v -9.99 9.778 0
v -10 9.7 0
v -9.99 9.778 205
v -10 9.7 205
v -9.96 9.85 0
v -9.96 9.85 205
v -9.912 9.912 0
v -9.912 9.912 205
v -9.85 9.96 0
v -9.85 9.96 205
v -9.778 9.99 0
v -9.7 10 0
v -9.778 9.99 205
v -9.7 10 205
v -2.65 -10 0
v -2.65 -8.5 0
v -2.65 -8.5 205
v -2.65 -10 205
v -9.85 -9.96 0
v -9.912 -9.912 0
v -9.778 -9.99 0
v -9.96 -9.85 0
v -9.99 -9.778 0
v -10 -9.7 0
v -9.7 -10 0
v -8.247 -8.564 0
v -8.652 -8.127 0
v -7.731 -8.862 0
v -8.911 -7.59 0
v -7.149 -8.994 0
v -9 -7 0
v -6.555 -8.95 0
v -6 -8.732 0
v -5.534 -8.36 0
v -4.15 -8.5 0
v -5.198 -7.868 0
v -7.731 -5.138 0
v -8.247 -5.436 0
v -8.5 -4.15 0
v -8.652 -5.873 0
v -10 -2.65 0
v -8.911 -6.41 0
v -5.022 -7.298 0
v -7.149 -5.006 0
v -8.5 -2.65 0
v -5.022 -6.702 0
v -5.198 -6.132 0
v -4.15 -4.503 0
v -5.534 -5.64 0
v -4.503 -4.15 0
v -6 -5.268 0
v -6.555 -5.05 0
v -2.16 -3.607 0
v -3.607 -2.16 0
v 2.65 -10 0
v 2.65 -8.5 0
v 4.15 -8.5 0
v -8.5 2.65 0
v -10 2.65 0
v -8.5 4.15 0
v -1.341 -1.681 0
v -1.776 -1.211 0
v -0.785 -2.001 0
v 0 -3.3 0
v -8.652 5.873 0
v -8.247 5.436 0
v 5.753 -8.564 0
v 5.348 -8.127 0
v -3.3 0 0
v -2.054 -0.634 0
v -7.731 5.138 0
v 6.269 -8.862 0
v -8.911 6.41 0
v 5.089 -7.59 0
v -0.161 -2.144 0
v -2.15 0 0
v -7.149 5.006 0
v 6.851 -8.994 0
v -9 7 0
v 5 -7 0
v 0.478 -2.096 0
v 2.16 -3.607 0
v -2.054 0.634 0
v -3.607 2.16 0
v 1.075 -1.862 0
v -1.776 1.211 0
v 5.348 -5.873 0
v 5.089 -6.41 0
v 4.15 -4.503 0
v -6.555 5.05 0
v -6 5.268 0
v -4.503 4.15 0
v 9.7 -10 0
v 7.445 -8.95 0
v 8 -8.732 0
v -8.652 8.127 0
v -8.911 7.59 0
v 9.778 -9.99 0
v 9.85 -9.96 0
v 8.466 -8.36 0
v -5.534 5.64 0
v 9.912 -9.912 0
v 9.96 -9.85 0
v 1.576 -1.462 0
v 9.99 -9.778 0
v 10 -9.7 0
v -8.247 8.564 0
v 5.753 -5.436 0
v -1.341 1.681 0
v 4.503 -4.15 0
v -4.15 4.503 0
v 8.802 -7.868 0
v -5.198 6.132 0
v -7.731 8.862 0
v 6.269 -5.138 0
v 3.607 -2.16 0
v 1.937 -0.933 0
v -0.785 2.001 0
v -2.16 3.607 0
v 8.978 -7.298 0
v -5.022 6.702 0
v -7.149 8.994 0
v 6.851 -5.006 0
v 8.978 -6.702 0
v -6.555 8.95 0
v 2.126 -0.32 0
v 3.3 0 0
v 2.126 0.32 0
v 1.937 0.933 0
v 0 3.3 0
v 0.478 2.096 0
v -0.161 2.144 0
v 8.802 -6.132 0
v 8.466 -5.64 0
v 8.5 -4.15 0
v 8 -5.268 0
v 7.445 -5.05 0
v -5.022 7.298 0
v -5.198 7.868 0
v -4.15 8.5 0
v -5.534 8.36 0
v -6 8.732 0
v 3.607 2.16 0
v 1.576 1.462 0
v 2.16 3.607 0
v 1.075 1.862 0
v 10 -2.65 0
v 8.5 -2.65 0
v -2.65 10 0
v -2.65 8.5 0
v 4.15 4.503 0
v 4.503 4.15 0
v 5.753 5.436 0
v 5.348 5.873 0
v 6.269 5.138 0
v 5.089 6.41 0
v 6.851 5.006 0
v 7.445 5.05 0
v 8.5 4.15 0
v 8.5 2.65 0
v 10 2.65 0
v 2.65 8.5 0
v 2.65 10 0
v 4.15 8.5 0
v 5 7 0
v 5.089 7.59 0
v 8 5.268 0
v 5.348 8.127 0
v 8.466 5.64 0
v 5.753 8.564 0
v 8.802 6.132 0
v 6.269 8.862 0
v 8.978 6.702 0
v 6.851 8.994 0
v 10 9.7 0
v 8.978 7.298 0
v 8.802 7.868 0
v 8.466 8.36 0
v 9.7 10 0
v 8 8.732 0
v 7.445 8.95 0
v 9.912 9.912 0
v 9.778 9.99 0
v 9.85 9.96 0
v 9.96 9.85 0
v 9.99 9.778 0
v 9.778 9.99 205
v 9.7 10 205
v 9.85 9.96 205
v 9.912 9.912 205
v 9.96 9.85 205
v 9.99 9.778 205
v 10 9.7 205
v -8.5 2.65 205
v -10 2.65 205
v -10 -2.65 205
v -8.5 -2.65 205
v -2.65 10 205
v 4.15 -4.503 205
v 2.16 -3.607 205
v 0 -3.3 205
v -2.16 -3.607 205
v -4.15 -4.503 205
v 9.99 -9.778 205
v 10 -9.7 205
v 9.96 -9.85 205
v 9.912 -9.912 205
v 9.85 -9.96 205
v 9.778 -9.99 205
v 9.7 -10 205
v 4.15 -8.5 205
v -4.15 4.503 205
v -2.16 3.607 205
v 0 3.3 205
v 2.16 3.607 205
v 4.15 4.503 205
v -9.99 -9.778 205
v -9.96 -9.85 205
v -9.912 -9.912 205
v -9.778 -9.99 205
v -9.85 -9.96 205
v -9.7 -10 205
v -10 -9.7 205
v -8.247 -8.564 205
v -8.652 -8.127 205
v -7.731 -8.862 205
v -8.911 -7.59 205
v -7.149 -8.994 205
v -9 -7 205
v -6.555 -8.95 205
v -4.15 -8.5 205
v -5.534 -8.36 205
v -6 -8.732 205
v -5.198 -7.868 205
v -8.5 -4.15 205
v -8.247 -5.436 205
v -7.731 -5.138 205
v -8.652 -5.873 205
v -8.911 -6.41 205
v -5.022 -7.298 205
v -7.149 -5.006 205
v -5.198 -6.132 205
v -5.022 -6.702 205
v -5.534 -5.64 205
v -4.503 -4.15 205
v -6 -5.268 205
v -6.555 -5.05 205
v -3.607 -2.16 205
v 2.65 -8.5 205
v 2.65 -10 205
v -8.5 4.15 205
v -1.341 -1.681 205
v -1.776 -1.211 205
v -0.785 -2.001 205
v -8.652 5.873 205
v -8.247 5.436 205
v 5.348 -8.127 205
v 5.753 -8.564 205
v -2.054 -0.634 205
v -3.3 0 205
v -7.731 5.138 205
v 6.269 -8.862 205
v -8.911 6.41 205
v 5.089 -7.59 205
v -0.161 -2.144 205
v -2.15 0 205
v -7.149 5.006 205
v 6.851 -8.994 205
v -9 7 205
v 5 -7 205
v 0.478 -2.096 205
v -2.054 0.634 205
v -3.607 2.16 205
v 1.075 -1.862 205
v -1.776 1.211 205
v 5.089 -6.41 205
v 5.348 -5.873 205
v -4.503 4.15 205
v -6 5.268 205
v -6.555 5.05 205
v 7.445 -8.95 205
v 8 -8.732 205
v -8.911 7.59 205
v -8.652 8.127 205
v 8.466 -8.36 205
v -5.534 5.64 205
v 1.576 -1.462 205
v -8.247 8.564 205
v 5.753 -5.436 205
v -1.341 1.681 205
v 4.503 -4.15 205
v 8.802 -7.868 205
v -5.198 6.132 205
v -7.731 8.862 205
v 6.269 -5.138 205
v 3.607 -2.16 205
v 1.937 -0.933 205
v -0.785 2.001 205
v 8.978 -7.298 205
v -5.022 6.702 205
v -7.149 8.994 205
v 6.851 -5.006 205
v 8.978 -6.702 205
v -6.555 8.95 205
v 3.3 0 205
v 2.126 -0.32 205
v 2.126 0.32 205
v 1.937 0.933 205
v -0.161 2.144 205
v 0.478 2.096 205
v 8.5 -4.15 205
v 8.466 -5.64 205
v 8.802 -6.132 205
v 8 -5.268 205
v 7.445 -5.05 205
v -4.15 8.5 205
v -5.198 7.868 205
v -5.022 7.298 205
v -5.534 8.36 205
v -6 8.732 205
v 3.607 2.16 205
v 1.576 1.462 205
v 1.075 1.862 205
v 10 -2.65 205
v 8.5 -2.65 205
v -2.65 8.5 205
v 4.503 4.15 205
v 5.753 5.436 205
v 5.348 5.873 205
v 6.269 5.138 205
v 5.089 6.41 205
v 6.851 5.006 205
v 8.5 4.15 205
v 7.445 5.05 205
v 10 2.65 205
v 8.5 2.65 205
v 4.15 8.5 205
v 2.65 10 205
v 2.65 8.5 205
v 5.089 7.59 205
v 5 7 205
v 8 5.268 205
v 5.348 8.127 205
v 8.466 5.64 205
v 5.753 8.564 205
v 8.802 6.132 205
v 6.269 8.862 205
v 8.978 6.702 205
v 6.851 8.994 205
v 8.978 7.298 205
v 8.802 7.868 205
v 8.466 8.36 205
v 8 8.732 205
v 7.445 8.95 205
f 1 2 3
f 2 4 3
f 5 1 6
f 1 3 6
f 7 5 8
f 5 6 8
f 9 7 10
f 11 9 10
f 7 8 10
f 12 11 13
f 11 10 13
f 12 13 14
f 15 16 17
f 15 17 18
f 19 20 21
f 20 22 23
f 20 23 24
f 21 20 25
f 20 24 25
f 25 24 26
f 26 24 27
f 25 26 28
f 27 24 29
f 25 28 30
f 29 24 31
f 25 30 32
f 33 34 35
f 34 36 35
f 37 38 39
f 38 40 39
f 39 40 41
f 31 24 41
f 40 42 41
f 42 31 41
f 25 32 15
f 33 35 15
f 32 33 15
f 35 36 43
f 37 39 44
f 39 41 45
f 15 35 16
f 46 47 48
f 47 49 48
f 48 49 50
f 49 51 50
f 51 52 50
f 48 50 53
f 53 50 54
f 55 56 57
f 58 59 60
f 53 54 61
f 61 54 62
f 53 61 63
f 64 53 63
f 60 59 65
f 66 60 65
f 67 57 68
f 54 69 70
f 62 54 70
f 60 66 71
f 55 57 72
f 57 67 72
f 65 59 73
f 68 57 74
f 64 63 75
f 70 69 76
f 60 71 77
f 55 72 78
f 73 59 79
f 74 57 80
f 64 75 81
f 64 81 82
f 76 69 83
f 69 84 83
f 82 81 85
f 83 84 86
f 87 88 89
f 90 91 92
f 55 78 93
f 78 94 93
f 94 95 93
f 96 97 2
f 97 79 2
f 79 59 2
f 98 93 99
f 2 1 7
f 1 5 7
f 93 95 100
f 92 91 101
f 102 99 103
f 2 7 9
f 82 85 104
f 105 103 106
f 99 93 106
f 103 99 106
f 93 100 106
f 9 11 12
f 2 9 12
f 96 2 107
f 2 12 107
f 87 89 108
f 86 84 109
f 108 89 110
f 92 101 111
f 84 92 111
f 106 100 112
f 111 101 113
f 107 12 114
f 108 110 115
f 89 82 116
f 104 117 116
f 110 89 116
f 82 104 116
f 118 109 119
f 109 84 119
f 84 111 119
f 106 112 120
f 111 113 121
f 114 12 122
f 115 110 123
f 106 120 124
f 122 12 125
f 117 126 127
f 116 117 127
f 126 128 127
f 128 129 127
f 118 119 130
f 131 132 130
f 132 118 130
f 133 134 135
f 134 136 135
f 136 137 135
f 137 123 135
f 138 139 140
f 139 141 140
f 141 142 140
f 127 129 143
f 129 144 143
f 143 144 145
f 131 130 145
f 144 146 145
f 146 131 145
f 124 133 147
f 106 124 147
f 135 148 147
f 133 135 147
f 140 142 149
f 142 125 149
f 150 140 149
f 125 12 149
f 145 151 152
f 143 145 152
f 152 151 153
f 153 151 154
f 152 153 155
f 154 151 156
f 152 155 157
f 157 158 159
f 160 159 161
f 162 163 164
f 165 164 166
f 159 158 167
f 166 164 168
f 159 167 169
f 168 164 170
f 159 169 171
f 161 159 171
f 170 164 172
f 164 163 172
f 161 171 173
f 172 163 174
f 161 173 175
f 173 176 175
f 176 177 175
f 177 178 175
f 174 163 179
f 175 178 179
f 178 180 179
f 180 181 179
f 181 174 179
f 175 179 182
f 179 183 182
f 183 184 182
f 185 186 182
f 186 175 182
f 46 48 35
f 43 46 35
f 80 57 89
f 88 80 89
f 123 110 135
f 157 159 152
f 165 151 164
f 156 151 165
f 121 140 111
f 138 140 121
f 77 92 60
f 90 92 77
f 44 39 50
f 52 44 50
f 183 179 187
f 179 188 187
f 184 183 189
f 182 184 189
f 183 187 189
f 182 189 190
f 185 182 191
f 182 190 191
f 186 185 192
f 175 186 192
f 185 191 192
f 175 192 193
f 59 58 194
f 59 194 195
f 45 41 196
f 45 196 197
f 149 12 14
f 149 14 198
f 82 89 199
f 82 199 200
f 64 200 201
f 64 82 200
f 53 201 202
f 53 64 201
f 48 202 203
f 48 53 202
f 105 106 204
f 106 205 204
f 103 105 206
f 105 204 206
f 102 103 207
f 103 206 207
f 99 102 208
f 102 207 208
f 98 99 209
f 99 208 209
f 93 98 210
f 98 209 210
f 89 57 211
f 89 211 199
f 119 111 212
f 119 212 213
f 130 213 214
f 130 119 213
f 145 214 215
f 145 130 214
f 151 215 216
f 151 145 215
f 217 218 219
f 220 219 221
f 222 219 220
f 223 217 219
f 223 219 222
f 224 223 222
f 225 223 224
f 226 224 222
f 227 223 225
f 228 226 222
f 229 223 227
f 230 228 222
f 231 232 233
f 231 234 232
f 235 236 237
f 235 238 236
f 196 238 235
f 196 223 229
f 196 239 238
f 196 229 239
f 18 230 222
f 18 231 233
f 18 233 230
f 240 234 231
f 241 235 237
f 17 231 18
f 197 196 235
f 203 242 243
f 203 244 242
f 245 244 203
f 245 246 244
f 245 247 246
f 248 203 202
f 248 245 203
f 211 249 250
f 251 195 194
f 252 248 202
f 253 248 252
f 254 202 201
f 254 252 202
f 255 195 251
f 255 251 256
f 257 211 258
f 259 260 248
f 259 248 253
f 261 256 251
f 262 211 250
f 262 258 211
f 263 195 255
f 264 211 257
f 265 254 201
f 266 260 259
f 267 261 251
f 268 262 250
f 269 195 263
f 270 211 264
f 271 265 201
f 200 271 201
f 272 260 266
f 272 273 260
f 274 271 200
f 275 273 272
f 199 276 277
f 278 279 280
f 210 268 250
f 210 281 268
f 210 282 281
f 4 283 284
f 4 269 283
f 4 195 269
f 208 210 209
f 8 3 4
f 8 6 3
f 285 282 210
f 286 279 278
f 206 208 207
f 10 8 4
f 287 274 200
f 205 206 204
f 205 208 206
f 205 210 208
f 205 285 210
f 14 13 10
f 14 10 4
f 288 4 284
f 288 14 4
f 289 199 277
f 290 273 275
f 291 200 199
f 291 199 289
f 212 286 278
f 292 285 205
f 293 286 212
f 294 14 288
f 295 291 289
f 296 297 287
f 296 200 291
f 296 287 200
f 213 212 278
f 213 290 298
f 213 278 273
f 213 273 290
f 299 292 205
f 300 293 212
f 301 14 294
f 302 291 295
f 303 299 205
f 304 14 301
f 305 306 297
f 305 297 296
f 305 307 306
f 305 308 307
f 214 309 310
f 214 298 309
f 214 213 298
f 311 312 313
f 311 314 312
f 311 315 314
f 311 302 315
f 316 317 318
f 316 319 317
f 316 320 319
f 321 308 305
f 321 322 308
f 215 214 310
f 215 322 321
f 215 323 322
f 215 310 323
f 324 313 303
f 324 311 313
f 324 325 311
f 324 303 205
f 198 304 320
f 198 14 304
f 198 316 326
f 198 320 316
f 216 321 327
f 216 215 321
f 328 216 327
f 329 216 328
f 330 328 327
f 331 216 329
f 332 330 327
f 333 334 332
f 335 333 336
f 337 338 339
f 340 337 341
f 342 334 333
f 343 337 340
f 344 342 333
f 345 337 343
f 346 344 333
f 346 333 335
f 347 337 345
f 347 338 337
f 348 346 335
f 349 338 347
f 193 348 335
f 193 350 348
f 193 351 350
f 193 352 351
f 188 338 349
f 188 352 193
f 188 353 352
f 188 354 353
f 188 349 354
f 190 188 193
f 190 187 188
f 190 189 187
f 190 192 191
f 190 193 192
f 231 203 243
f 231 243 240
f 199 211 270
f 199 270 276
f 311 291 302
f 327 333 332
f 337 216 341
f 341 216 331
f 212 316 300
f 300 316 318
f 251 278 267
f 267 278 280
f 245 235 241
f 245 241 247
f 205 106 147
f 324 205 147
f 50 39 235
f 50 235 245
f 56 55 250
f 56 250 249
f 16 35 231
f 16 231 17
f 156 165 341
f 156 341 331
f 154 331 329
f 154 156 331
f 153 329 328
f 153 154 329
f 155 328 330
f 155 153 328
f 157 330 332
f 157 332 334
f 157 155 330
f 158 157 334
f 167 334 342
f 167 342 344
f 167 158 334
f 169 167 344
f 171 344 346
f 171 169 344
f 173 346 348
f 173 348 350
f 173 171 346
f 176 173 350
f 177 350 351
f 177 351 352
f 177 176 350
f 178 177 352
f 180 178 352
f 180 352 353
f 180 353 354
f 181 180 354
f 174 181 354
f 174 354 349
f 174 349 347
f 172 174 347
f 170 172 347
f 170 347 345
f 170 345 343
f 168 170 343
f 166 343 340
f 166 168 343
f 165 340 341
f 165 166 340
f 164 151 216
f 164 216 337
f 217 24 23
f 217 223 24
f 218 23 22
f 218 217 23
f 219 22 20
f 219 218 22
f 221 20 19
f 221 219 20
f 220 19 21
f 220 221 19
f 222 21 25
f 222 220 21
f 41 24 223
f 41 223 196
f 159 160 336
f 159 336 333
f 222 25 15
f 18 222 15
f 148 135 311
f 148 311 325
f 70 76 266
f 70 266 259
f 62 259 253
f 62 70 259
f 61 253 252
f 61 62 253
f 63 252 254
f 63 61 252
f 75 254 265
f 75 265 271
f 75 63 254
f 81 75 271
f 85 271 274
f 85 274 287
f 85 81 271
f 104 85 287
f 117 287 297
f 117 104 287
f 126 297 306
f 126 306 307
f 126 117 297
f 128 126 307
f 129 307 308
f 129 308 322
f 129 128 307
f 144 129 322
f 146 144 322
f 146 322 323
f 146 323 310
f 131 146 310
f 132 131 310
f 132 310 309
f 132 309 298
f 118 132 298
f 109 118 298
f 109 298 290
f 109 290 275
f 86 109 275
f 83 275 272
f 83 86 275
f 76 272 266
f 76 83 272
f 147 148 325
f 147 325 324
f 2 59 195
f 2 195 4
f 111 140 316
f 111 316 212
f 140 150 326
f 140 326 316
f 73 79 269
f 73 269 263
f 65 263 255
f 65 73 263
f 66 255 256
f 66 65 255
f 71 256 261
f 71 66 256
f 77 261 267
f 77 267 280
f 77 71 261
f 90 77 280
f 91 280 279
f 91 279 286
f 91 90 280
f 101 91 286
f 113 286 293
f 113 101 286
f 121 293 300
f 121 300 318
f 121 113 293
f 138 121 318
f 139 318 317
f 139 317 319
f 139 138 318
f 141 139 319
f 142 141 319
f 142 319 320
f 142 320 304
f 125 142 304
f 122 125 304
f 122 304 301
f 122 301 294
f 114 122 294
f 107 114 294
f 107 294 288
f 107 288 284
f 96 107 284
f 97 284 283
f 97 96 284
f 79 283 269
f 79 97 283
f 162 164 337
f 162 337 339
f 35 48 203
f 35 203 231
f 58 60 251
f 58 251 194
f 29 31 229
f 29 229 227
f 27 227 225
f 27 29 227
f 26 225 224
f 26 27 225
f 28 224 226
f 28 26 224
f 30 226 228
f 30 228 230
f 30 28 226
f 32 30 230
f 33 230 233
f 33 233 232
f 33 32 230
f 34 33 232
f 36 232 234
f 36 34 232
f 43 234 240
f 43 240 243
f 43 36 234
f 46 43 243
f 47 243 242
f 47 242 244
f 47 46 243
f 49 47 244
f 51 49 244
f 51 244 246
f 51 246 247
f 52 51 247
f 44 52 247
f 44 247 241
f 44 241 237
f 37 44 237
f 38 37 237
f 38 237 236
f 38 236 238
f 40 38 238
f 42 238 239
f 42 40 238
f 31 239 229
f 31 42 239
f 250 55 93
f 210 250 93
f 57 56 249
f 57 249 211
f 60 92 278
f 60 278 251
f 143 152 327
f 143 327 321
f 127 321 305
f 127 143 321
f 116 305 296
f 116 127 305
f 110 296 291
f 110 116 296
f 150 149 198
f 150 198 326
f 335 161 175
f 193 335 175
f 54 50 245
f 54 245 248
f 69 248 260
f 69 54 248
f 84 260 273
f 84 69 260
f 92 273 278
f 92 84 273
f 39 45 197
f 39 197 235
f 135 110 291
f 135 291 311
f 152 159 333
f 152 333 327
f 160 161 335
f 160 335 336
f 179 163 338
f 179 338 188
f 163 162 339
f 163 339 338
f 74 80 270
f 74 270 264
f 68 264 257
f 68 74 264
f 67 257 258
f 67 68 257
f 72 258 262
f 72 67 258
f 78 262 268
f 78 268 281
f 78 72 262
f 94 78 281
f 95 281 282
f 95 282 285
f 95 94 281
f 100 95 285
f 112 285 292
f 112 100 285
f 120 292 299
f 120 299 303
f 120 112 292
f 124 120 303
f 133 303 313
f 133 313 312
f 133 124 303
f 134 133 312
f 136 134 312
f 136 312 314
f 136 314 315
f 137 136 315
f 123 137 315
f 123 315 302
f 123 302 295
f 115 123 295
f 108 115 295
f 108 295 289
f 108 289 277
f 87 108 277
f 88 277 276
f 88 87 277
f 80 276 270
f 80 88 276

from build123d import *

# Parameters (mm, degrees)
SKETCH_1_W               = 20
SKETCH_1_H               = 20
SKETCH_1_R               = 2
SKETCH_1_R_2             = 2.15
EXTRUDE_1_DEPTH          = 205
CUT_EXTRUDE_1_REACH      = 207.487
PATTERN_CIRCULAR_1_COUNT = 4
FILLET_1_R               = 0.3


with BuildPart() as part:
    # 스케치1 → 보스-돌출1 (new body)
    with BuildSketch(Plane.XY):
        Rectangle(SKETCH_1_W, SKETCH_1_H)
        with Locations((-7, -7)):
            Circle(SKETCH_1_R, mode=Mode.SUBTRACT)
        with Locations((7, -7)):
            Circle(SKETCH_1_R, mode=Mode.SUBTRACT)
        with Locations((-7, 7)):
            Circle(SKETCH_1_R, mode=Mode.SUBTRACT)
        Circle(SKETCH_1_R_2, mode=Mode.SUBTRACT)
        with Locations((7, 7)):
            Circle(SKETCH_1_R, mode=Mode.SUBTRACT)
    extrude(amount=EXTRUDE_1_DEPTH)

    # 스케치1<3> → 컷-돌출1 (cut, up to next)
    with BuildSketch(Plane.XY, mode=Mode.PRIVATE) as cut_extrude_1_sk1:
        with BuildLine():
            Line((-8.5, 2.65), (-10, 2.65))
            Line((-10, 2.65), (-10, -2.65))
            Line((-10, -2.65), (-8.5, -2.65))
            Line((-8.5, -2.65), (-8.5, -4.15))
            Line((-8.5, -4.15), (-4.503166667, -4.15))
            ThreePointArc((-4.503166667, -4.15), (-3.3, 0), (-4.503166667, 4.15))
            Line((-4.503166667, 4.15), (-8.5, 4.15))
            Line((-8.5, 4.15), (-8.5, 2.65))
        make_face()
    cut_extrude_1_tool1 = extrude(cut_extrude_1_sk1.sketch, amount=CUT_EXTRUDE_1_REACH, mode=Mode.PRIVATE) & part.part
    cut_extrude_1 = cut_extrude_1_tool1.solids().sort_by_distance((-6.606913, 0, 0))[0]
    add(cut_extrude_1, mode=Mode.SUBTRACT)

    # 원형 패턴1: 컷-돌출1 ×4 about axis
    pattern_circular_1_axis = Axis((0, 0, 205), (0, 0, -1))
    for i in range(1, PATTERN_CIRCULAR_1_COUNT):
        add(cut_extrude_1.rotate(pattern_circular_1_axis, i * 360 / PATTERN_CIRCULAR_1_COUNT), mode=Mode.SUBTRACT)

    # 필렛1
    fillet_1_edges = [part.edges().sort_by_distance(p)[0] for p in [
        (10, -10, 102.5),
        (-10, -10, 102.5),
        (-10, 10, 102.5),
        (10, 10, 102.5),
    ]]
    fillet(fillet_1_edges, radius=FILLET_1_R)


solid = part.part
